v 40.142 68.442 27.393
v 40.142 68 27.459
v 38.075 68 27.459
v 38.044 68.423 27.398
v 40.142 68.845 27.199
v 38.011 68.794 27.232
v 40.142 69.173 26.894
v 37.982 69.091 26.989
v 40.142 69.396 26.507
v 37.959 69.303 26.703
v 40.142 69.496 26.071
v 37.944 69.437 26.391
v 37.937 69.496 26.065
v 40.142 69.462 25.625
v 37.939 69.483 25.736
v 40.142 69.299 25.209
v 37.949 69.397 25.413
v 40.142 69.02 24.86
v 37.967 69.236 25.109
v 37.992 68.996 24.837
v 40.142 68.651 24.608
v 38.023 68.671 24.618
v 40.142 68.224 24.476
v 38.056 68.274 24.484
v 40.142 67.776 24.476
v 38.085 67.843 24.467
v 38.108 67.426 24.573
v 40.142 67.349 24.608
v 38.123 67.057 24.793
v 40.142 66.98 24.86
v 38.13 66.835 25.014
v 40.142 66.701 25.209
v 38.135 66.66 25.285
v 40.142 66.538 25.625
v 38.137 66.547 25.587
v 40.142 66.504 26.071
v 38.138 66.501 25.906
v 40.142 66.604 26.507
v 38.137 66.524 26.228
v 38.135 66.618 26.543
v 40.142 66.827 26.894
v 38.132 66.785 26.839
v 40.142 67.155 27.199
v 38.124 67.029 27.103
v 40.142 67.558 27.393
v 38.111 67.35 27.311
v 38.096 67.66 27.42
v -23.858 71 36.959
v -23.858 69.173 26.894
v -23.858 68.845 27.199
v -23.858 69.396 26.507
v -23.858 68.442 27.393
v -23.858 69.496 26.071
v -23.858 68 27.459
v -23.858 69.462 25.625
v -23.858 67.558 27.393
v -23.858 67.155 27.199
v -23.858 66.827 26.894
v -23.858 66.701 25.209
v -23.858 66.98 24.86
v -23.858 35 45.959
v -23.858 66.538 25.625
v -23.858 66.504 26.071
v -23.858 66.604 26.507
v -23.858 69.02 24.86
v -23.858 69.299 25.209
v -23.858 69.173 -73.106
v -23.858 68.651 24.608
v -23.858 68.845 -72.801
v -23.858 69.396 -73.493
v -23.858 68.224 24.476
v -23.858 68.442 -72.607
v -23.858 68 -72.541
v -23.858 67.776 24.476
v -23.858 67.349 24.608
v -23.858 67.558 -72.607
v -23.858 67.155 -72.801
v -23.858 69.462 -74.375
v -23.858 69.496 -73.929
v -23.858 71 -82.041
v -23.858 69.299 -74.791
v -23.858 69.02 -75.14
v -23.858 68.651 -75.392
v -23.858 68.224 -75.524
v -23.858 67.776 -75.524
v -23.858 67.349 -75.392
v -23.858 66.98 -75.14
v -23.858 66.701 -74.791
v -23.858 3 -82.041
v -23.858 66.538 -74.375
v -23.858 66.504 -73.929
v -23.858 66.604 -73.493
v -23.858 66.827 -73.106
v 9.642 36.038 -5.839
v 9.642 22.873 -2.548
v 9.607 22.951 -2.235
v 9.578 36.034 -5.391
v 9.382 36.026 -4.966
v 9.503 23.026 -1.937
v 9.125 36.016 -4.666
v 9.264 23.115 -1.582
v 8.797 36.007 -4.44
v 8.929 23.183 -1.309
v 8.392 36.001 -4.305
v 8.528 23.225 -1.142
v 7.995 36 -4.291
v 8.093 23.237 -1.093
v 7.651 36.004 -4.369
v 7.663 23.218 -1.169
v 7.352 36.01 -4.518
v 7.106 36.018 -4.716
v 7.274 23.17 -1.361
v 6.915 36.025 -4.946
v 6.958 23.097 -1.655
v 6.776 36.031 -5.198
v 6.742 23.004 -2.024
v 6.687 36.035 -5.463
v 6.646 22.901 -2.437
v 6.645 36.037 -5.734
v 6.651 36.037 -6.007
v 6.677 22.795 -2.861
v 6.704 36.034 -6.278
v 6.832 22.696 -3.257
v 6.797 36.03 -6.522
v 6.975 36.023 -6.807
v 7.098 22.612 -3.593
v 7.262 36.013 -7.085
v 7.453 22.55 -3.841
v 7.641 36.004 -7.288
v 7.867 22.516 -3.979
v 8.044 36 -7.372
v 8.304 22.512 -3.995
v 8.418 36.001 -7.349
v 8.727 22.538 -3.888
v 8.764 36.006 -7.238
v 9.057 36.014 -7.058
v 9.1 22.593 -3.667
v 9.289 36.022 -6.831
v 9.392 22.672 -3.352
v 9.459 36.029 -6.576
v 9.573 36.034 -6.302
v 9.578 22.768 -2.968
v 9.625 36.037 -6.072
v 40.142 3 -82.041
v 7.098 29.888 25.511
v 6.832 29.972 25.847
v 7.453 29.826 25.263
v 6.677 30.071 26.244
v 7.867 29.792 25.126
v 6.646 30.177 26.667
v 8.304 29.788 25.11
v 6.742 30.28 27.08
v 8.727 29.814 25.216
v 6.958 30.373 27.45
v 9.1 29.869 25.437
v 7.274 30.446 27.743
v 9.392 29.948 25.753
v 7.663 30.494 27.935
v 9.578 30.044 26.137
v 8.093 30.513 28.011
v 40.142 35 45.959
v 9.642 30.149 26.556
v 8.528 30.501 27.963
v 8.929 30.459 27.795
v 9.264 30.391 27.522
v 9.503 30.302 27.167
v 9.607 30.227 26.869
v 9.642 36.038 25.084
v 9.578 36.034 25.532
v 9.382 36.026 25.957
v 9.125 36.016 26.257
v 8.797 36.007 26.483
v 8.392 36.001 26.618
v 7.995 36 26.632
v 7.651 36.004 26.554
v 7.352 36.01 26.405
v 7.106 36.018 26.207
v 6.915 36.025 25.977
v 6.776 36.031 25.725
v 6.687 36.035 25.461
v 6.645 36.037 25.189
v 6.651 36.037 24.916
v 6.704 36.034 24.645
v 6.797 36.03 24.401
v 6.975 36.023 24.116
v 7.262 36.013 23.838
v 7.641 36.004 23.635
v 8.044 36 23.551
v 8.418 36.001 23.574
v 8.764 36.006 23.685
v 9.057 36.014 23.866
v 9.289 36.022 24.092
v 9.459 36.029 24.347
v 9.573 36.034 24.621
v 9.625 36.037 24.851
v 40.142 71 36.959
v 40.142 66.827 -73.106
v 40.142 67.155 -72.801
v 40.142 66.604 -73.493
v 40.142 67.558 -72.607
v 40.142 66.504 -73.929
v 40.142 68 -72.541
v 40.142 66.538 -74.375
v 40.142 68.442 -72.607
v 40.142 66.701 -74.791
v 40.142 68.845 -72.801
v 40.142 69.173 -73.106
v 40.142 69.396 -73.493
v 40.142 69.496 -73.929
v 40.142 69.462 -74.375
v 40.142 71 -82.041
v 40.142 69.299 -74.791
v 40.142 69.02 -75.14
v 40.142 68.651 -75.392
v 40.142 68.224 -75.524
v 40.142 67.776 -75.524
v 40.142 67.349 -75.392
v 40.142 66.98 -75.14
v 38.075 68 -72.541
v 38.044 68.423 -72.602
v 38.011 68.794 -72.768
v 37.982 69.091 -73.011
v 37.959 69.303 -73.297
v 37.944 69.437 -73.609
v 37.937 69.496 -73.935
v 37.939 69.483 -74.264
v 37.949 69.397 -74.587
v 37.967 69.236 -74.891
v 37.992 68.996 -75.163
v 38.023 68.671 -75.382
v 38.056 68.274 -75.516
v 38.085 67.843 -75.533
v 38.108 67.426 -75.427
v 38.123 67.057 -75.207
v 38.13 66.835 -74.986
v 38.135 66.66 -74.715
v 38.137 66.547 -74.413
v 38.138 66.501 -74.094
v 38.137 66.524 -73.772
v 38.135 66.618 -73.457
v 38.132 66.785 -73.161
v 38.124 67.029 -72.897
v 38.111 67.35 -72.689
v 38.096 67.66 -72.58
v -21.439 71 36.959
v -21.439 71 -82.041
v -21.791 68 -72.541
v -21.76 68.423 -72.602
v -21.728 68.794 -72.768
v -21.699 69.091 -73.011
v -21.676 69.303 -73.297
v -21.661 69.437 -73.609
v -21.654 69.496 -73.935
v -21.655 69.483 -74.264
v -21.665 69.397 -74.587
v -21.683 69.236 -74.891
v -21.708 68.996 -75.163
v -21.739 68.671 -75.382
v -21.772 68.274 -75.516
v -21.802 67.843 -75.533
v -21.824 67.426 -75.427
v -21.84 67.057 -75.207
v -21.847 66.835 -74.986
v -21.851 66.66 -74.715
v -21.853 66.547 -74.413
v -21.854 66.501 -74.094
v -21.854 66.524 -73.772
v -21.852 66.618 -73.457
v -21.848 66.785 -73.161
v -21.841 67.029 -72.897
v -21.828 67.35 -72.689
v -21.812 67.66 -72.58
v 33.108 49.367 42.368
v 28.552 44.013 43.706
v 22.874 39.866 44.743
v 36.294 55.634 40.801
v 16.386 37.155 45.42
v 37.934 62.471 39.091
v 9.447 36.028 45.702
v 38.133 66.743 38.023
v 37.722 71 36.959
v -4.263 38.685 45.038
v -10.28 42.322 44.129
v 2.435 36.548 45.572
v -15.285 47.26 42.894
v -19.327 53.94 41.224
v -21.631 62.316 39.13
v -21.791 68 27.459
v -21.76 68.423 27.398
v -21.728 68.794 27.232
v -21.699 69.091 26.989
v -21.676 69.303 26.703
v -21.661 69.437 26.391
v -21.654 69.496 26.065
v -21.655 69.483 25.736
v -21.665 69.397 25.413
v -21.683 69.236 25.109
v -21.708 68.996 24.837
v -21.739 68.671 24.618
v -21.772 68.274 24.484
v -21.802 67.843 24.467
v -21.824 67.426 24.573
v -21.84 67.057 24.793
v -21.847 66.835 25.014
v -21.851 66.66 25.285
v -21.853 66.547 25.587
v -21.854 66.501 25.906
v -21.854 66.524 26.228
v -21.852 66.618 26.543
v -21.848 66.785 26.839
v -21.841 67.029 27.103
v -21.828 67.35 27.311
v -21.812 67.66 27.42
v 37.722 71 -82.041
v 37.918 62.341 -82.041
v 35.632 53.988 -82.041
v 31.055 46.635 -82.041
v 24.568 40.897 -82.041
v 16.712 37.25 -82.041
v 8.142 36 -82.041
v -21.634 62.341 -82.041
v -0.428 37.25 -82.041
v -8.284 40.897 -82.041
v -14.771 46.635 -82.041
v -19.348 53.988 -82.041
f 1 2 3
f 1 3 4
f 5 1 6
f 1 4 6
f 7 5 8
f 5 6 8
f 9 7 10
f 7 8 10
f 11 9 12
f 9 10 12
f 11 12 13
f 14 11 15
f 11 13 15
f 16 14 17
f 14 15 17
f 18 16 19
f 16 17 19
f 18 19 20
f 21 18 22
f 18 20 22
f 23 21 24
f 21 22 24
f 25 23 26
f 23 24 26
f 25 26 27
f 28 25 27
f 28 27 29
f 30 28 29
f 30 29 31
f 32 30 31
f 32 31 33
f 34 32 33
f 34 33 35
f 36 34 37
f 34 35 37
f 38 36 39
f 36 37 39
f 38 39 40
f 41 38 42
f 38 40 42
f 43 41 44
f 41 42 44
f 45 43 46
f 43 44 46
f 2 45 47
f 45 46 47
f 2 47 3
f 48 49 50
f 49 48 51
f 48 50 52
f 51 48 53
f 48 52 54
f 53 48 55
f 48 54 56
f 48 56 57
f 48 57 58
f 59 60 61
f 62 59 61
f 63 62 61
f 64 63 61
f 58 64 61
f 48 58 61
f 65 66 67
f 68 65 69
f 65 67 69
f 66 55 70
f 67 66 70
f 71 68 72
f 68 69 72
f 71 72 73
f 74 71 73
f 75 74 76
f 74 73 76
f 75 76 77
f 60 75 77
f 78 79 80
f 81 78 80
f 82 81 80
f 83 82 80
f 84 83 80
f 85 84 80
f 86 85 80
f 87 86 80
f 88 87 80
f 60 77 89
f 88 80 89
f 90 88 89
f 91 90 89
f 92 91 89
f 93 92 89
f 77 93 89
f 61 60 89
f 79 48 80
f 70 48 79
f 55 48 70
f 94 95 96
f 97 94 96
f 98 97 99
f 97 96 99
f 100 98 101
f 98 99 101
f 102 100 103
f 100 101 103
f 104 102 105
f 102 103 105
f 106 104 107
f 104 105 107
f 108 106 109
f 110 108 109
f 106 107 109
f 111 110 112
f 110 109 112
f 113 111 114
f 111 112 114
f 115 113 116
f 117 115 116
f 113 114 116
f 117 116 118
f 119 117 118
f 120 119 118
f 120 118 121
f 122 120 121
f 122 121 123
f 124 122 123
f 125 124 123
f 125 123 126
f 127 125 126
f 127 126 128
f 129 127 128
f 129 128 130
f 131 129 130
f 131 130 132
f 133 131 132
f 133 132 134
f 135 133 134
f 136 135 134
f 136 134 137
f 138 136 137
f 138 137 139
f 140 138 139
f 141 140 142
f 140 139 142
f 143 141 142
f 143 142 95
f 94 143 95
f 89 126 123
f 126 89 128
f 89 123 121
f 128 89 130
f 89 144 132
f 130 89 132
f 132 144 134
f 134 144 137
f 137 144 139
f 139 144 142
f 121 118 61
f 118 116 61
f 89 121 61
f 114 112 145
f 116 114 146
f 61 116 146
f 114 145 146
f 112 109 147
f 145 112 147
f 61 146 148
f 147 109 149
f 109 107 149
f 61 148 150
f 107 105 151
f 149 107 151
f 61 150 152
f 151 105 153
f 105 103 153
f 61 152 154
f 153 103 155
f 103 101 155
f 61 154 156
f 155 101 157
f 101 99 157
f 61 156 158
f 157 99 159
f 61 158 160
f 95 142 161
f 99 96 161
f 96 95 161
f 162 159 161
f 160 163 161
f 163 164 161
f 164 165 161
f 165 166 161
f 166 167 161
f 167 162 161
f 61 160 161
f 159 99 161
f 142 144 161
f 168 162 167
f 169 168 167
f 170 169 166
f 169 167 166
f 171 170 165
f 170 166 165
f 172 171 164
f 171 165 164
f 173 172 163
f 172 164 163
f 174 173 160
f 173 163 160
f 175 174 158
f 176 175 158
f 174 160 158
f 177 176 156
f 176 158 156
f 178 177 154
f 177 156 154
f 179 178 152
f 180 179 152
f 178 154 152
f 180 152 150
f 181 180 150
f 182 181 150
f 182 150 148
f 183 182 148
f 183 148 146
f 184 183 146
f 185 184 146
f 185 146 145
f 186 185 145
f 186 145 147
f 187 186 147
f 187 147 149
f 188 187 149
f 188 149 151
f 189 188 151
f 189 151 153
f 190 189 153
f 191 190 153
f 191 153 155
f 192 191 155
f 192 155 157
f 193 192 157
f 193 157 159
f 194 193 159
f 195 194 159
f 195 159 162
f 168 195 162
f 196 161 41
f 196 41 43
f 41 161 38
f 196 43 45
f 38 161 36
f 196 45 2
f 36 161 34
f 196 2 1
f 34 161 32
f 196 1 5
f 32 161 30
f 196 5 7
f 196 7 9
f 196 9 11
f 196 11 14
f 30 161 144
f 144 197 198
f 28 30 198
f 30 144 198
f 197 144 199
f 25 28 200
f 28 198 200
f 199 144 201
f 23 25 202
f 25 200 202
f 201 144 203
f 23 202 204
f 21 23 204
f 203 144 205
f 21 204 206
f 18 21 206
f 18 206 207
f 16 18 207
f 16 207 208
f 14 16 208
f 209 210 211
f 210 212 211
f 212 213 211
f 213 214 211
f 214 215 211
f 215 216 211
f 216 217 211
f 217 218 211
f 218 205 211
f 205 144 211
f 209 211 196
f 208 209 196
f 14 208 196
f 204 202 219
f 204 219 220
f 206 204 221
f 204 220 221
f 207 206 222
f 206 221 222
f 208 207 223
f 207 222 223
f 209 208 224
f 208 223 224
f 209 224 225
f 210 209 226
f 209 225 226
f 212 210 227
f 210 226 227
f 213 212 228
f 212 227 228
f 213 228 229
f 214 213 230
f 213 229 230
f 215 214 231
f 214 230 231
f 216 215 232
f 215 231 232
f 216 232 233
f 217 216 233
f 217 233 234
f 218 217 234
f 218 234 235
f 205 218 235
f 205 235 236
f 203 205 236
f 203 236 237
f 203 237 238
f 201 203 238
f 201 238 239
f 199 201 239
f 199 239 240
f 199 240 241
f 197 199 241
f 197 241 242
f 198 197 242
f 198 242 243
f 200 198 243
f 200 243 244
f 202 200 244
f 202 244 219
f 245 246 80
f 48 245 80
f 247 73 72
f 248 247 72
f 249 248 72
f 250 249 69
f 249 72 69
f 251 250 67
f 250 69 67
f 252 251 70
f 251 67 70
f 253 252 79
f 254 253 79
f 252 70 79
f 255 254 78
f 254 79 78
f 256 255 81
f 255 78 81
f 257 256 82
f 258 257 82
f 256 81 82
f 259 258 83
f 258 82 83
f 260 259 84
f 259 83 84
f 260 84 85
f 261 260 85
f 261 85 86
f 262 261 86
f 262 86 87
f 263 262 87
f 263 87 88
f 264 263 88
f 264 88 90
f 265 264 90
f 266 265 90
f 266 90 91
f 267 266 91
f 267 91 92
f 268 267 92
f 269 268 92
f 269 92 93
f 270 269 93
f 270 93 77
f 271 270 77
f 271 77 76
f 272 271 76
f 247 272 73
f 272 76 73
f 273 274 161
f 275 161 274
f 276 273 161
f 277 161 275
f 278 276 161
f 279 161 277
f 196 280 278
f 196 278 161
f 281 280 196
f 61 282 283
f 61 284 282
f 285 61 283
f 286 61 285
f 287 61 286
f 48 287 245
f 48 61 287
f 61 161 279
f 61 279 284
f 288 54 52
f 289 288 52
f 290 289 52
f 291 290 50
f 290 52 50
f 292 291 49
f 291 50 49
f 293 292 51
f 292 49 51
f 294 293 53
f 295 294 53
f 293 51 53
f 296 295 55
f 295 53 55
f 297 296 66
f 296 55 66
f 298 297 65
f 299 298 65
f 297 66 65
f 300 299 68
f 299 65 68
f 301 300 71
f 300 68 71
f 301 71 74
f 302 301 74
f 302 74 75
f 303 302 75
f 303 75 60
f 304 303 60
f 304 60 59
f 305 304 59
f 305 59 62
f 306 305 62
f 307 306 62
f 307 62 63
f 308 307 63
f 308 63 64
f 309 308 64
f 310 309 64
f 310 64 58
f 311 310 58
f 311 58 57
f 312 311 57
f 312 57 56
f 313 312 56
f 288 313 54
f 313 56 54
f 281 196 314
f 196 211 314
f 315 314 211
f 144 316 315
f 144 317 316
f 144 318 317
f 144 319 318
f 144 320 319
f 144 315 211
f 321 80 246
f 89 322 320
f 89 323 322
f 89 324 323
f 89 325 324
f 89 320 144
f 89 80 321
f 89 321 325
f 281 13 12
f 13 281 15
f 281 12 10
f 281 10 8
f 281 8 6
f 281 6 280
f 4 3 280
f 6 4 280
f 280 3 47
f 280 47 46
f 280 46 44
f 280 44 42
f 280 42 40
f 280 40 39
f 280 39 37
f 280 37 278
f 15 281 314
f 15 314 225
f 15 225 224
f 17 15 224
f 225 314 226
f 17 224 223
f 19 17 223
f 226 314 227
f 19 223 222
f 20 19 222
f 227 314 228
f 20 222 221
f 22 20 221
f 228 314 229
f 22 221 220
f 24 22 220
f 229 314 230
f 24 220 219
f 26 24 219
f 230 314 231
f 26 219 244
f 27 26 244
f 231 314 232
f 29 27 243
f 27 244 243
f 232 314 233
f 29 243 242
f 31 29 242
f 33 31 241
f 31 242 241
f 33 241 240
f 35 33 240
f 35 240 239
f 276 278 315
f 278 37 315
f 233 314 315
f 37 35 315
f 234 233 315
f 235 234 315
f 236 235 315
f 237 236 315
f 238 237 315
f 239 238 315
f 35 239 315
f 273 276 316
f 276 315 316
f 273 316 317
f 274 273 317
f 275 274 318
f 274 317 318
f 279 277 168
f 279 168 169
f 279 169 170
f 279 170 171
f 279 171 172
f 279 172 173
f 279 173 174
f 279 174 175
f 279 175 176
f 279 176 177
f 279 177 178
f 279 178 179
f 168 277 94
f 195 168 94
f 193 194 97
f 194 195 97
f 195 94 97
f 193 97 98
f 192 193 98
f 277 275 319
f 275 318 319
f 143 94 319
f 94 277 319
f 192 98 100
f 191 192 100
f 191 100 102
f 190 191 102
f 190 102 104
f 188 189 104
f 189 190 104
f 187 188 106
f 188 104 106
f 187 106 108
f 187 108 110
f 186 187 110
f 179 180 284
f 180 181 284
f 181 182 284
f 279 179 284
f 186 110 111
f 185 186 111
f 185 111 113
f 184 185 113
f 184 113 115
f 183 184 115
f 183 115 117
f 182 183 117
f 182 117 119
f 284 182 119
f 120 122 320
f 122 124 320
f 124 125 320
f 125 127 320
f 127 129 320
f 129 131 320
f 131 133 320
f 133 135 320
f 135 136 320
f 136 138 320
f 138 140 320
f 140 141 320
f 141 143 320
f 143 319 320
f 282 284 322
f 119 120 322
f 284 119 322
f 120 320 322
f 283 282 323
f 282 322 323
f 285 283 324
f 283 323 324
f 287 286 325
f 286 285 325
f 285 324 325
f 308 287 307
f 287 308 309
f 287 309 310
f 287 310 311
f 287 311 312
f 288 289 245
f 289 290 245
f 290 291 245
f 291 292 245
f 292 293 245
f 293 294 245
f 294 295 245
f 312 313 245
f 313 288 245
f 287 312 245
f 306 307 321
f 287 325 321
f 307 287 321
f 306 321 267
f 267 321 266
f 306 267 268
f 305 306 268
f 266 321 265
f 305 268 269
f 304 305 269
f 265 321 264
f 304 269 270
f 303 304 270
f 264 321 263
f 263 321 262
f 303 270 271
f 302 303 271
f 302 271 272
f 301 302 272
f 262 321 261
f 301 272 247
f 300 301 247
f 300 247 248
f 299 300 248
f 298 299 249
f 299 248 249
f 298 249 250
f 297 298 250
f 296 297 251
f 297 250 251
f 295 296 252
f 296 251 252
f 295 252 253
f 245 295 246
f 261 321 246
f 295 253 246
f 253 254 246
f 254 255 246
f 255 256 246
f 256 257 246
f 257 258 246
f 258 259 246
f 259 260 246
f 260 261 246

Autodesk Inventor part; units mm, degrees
ref_plane "YZ Plane" through (0, 0, 0) normal (1, 0, 0) x (0, 1, 0)
ref_plane "XZ Plane" through (0, 0, 0) normal (0, 1, 0) x (-1, 0, 0)
ref_plane "XY Plane" through (0, 0, 0) normal (0, 0, 1) x (1, 0, 0)
sketch "Sketch1" plane through (0, 0, 0) normal (0, 1, 0) x (-1, 0, 0)
  line L0 (23.8582, 45.9592) -> (-40.1418, 45.9592)
  line L1 (-40.1418, 45.9592) -> (-40.1418, -94.0408)
  line L2 (-40.1418, -94.0408) -> (23.8582, -94.0408)
  line L3 (23.8582, -94.0408) -> (23.8582, 45.9592)
  point P0 (0, 0)
  dimension "d0" = 140
  dimension "d1" = 64
extrude "Extrusion1" add sketch "Sketch1" along normal blind 36
sketch "Sketch2" plane through (40.1418, 0, 45.9592) normal (1, 0, 0) x (0, 0, -1)
  line L0 (0, 0) -> (140, 0) projected
  line L1 (0, 36) -> (140, 36) projected
  line L2 (0, 0) -> (0, 36)
  line L3 (140, 0) -> (0, 35)
  line L4 (0, 0) -> (0, 36) projected
  point P0 (45.9592, 0)
  dimension "d35" = 1
extrude "Extrusion2" cut sketch "Sketch2" against normal through all
sketch "Sketch5" plane through (40.1418, 36, -94.0408) normal (0, 0, -1) x (-1, 0, 0)
  line L0 (64, 0) -> (0, 0)
  line L1 (0, 0) -> (0, 35)
  line L2 (0, 35) -> (64, 35)
  line L3 (64, 35) -> (64, 0)
  line L4 (64, -36) -> (64, 0) projected
  line L5 (0, -36) -> (0, 0) projected
  line L6 (0, 0) -> (64, 0) projected
  point P0 (40.1418, -36)
  dimension "d18" = 0
  dimension "d19" = 0
  dimension "d20" = 35
  dimension "d23" = 0
extrude "Extrusion3" add sketch "Sketch5" against normal blind 140
sketch "Sketch8" plane through (40.1418, 0, -94.0408) normal (0, 0, -1) x (-1, 0, 0)
  circle A0 centre (32, 66) radius 30
  line L0 (0, 0) -> (64, 0) projected
  line L1 (0, 0) -> (0, 71) projected
  point P0 (40.1418, 0)
  dimension "d43" = 66
  dimension "d44" = 32
  dimension "d45" = 60
extrude "Extrusion6" cut sketch "Sketch8" against normal through all
sketch "Sketch9" plane through (-23.8582, 0, -94.0408) normal (-1, 0, 0) x (0, 0, 1)
  circle A0 centre (20, 68) radius 1.5
  circle A1 centre (120, 68) radius 1.5
  line L0 (0, 0) -> (0, 71) projected
  line L1 (0, 71) -> (140, 71) projected
  point P0 (94.0408, 0)
  dimension "d48" = 20
  dimension "d49" = 3
  dimension "d50" = 3
  dimension "d51" = 3
  dimension "d52" = 3
  dimension "d53" = 120
extrude "Extrusion7" cut sketch "Sketch9" against normal through all
sketch "Sketch10" plane through (-23.8582, 0, -94.0408) normal (-1, 0, 0) x (0, 0, 1)
  line L0 (140, 35) -> (140, 71) projected
  line L1 (140, 35) -> (131, 71)
  line L2 (0, 0) -> (140, 35) projected
  line L3 (140, 71) -> (131, 71)
  line L4 (0, 71) -> (140, 71) projected
  line L5 (140, 71) -> (0, 71) projected
  line L6 (12, 71) -> (12, 3)
  line L7 (0, 0) -> (0, 71) projected
  point P0 (94.0408, 0)
  dimension "d56" = 90
  dimension "d67" = 12
extrude "Extrusion8" cut sketch "Sketch10" against normal through all contours L1 L3 L0 | L2 L7 L4 L6
sketch "Sketch11" plane through (-23.8582, 0, -94.0408) normal (0, -0.9701, 0.2425) x (1, 0, 0)
  circle A0 centre (32, 124.3087) radius 1.5
  line L0 (0, 0) -> (0, 144.3087) projected
  line L1 (0, 144.3087) -> (64, 144.3087) projected
  circle A1 centre (32, 94.3087) radius 1.5
  point P0 (23.8582, 91.2329)
  dimension "d59" = 3
  dimension "d60" = 32
  dimension "d61" = 20
  dimension "d62" = 32
  dimension "d63" = 50
  dimension "d64" = 3
extrude "Extrusion9" cut sketch "Sketch11" against normal through all
properties part number "rampe-goulotte"
